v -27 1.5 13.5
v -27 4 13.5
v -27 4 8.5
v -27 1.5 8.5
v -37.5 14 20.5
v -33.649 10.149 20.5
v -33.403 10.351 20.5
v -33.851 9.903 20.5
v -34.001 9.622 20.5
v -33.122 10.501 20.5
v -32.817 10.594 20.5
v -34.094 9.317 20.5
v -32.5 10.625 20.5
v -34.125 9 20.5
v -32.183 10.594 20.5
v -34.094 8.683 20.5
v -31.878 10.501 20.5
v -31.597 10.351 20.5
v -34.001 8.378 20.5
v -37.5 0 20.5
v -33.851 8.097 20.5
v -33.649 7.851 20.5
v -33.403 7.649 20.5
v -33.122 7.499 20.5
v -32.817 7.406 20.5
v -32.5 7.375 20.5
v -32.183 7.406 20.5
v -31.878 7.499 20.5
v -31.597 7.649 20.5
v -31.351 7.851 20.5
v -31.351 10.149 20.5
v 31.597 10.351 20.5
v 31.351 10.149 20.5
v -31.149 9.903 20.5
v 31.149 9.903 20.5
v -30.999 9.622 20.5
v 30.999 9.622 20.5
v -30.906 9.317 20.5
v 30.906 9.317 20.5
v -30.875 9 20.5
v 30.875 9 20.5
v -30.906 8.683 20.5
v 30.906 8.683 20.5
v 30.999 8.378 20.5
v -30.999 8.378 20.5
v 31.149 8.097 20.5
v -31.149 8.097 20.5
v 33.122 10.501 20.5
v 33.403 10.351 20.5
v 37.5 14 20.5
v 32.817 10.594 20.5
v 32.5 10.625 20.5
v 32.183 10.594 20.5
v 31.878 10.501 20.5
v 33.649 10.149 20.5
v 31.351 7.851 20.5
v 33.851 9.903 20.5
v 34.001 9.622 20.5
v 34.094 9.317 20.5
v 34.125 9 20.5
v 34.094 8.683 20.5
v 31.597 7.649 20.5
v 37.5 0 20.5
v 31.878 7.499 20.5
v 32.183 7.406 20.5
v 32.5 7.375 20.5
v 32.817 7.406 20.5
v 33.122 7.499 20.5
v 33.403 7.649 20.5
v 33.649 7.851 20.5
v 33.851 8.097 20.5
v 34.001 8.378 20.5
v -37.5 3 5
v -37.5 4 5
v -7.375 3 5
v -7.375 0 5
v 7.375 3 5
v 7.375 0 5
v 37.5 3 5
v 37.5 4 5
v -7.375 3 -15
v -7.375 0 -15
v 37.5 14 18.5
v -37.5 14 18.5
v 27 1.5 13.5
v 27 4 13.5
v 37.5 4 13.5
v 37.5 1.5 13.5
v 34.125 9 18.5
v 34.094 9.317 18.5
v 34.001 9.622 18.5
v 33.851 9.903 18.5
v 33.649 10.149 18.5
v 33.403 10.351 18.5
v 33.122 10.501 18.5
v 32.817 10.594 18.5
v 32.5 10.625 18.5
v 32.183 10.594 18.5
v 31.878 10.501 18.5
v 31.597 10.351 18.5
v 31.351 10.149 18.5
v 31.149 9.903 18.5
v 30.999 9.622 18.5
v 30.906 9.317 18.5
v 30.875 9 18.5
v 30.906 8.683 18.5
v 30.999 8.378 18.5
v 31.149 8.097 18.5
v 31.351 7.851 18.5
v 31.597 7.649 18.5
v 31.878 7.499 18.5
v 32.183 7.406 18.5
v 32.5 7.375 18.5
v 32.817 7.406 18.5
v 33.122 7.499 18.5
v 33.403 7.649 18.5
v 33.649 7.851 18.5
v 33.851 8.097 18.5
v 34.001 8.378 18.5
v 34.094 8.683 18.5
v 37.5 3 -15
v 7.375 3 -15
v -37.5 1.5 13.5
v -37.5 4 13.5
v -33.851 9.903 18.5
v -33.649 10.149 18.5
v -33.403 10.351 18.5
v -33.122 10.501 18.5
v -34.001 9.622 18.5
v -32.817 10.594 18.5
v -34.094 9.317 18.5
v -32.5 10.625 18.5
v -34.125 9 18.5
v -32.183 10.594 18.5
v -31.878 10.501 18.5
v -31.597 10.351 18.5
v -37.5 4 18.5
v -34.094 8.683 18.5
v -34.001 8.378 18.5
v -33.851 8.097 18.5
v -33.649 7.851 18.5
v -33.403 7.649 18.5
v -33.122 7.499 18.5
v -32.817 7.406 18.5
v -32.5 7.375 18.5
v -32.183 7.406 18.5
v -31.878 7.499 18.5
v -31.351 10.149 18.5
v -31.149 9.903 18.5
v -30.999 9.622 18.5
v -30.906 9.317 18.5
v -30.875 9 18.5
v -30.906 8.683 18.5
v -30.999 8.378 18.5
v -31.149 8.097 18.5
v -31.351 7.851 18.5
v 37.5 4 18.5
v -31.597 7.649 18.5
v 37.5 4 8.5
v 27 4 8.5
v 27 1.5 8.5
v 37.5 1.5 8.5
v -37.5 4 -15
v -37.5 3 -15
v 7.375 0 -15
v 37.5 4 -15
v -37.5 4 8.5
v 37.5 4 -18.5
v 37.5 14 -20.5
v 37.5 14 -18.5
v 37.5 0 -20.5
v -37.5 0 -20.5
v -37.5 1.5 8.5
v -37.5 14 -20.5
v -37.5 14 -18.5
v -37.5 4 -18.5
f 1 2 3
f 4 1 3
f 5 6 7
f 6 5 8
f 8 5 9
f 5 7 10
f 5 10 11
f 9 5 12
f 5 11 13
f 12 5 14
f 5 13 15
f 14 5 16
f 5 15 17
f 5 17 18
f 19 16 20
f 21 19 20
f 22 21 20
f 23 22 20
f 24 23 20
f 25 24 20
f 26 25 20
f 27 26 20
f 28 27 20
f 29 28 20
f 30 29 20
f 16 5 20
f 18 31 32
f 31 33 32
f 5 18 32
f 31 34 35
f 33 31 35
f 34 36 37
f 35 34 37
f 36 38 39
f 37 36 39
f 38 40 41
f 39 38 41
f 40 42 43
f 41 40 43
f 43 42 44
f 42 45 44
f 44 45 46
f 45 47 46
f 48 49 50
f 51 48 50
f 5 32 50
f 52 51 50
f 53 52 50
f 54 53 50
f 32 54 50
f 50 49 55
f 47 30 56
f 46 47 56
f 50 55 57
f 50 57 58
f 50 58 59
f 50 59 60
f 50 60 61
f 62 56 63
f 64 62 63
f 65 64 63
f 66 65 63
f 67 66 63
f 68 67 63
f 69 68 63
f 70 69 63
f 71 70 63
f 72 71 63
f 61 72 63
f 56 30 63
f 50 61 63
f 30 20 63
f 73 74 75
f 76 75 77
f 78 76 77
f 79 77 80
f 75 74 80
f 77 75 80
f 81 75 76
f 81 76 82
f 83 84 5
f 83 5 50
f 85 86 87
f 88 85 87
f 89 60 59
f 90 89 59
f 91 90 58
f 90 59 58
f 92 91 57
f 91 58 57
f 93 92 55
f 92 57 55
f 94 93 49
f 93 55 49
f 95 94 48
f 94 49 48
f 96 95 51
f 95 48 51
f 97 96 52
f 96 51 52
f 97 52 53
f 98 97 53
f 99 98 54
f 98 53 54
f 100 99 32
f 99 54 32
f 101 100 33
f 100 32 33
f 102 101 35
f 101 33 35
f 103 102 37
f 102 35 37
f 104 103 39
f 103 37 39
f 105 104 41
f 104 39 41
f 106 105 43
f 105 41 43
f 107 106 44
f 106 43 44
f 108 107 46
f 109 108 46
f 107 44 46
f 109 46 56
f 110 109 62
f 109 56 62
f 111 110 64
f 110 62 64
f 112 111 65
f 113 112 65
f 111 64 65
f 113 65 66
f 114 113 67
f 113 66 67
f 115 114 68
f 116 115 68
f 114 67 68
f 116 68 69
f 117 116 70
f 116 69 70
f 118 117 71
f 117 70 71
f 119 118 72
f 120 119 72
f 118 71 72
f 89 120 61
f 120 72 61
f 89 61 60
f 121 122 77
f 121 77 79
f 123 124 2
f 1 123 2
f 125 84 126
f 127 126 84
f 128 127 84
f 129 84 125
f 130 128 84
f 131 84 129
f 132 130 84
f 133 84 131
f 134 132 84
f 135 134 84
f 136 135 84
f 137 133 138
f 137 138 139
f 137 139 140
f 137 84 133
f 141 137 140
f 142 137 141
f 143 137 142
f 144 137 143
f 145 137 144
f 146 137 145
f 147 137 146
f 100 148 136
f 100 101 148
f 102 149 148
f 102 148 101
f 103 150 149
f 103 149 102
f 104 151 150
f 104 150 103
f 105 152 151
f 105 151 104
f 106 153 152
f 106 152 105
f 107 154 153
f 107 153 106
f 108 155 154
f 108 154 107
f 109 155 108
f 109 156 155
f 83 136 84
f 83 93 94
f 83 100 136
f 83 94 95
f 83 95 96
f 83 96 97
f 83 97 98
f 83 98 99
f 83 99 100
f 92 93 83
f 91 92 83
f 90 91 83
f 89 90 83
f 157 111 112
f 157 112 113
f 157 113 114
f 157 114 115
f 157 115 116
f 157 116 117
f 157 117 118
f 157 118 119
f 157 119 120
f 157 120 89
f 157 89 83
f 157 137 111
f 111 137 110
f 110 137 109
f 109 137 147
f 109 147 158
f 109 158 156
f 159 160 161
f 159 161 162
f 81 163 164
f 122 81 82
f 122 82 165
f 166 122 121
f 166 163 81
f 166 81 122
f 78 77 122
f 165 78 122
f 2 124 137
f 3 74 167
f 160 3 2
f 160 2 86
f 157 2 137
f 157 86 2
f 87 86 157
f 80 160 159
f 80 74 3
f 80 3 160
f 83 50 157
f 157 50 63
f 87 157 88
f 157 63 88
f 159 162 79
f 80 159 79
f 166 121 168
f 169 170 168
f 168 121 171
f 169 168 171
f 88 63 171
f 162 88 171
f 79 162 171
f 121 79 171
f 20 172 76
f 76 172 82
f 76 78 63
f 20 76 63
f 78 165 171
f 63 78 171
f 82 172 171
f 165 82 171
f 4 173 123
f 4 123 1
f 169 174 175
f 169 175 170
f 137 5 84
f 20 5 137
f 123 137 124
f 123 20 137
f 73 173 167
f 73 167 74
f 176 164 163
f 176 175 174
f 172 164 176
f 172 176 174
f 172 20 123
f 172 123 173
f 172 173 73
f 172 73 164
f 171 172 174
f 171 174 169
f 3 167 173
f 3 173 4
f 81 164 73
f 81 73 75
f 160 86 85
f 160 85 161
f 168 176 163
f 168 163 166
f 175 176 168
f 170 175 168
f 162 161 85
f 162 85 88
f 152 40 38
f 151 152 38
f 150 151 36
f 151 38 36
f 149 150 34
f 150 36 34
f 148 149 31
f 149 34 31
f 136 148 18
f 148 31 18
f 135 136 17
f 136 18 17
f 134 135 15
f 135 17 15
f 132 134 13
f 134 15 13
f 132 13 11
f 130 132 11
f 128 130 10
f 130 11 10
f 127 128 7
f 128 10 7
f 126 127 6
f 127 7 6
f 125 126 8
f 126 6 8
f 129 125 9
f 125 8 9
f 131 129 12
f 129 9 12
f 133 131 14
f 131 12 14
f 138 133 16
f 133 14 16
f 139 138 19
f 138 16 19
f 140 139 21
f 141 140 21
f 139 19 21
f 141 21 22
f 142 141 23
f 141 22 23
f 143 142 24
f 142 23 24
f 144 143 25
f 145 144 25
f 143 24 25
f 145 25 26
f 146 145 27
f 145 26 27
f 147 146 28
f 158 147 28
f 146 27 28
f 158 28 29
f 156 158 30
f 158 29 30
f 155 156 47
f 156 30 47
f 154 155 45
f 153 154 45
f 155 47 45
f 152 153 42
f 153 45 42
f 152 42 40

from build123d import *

# Parameters (mm, degrees)
SKETCH1_W           = 75
SKETCH1_H           = 41
BOSS_EXTRUDE1_DEPTH = 4
SKETCH2_W           = 75
SKETCH2_H           = 2
BOSS_EXTRUDE2_DEPTH = 10
SKETCH3_W           = 75
SKETCH3_H           = 2
BOSS_EXTRUDE3_DEPTH = 10
SKETCH6_W           = 14.75
SKETCH6_H           = 20
CUT_EXTRUDE3_DEPTH  = 44.891912695
SKETCH7_W           = 75
SKETCH7_H           = 20
CUT_EXTRUDE4_DEPTH  = 1
SKETCH10_R          = 1.625
CUT_EXTRUDE5_DEPTH  = 2
SKETCH11_W          = 10.5
SKETCH11_H          = 5
CUT_EXTRUDE6_DEPTH  = 2.5


with BuildPart() as part:
    # Sketch1 → Boss-Extrude1 (new body)
    with BuildSketch(Plane(origin=(0, 0, 0), x_dir=(1, 0, 0), z_dir=(0, 1, 0))):
        Rectangle(SKETCH1_W, SKETCH1_H)
    extrude(amount=BOSS_EXTRUDE1_DEPTH)

    # Sketch2 → Boss-Extrude2 (add)
    with BuildSketch(Plane(origin=(0, 4, 0), x_dir=(1, 0, 0), z_dir=(0, 1, 0))):
        with Locations((0, 19.5)):
            Rectangle(SKETCH2_W, SKETCH2_H)
    extrude(amount=BOSS_EXTRUDE2_DEPTH)

    # Sketch3 → Boss-Extrude3 (add)
    with BuildSketch(Plane(origin=(0, 4, 0), x_dir=(1, 0, 0), z_dir=(0, 1, 0))):
        with Locations((0, -19.5)):
            Rectangle(SKETCH3_W, SKETCH3_H)
    extrude(amount=BOSS_EXTRUDE3_DEPTH)

    # Sketch6 → Cut-Extrude3 (cut, through all)
    with BuildSketch(Plane(origin=(0, 4, 0), x_dir=(1, 0, 0), z_dir=(0, 1, 0))):
        with Locations((0, 5)):
            Rectangle(SKETCH6_W, SKETCH6_H)
    extrude(amount=-CUT_EXTRUDE3_DEPTH, mode=Mode.SUBTRACT)

    # Sketch7 → Cut-Extrude4 (cut)
    with BuildSketch(Plane(origin=(0, 4, 0), x_dir=(1, 0, 0), z_dir=(0, 1, 0))):
        with Locations((0, 5)):
            Rectangle(SKETCH7_W, SKETCH7_H)
    extrude(amount=-CUT_EXTRUDE4_DEPTH, mode=Mode.SUBTRACT)

    # Sketch10 → Cut-Extrude5 (cut)
    with BuildSketch(Plane.XY.offset(20.5)):
        with Locations((-32.5, 9)):
            Circle(SKETCH10_R)
        with Locations((32.5, 9)):
            Circle(SKETCH10_R)
    extrude(amount=-CUT_EXTRUDE5_DEPTH, mode=Mode.SUBTRACT)

    # Sketch11 → Cut-Extrude6 (cut)
    with BuildSketch(Plane(origin=(0, 4, 0), x_dir=(1, 0, 0), z_dir=(0, 1, 0))):
        with Locations((-32.25, -11)):
            Rectangle(SKETCH11_W, SKETCH11_H)
        with Locations((32.25, -11)):
            Rectangle(SKETCH11_W, SKETCH11_H)
    extrude(amount=-CUT_EXTRUDE6_DEPTH, mode=Mode.SUBTRACT)


solid = part.part
